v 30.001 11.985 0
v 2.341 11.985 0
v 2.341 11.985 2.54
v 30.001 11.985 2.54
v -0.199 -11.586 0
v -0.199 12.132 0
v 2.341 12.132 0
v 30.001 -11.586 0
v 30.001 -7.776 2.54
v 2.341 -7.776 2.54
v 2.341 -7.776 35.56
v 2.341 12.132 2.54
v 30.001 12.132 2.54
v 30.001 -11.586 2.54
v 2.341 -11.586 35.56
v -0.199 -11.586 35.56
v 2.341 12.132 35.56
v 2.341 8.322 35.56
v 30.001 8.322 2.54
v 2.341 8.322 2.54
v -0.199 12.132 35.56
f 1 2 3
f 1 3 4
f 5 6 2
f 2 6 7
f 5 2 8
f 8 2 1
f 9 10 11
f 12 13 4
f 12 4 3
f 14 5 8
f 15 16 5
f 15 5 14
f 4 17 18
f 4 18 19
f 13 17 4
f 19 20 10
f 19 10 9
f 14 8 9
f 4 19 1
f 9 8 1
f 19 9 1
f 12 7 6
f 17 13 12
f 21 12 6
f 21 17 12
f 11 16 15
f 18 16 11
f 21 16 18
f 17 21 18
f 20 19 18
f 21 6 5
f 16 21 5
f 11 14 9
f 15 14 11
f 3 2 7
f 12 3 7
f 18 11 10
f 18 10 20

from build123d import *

# Parameters (mm, degrees)
F1_DEPTH = 35.56
F2_W     = 27.6606
F2_H     = 23.5712
F4_DEPTH = 2.54
F7_DEPTH = 3.81
F8_DEPTH = 3.81


with BuildPart() as f1:
    # F0 (on Top) → F1 (new body)
    with BuildSketch(Plane.XY):
        Polygon((0, 12.2589374599), (0, 12.1117923089), (0, -11.4594076911), (2.54, -11.4594076911), (2.54, 12.2589374599), align=None)
    extrude(amount=F1_DEPTH)


with BuildPart() as f1_1:
    # F3: moved
    add(f1.part.moved(Location((-0.1992022446, -0.1268434648, 0))))

    # F2 (on Top) → F4 (join)
    with BuildSketch(Plane.XY):
        with Locations((16.1710977554, 0.1993488441)):
            Rectangle(F2_W, F2_H)
    extrude(amount=F4_DEPTH)

    # F5 (on face) → F7 (join)
    with BuildSketch(Plane.XZ.offset(11.5862511559)):
        Polygon((30.0013977554, 2.54), (2.3407977554, 35.56), (2.3407977554, 2.54), align=None)
    extrude(amount=-F7_DEPTH)

    # F6 (on face) → F8 (join)
    with BuildSketch(Plane(origin=(0, 12.1320939951, 0), x_dir=(-1, 0, 0), z_dir=(0, 1, 0))):
        Polygon((-2.3407977554, 35.56), (-30.0013977554, 2.54), (-2.3407977554, 2.54), align=None)
    extrude(amount=-F8_DEPTH)


solid = f1_1.part
